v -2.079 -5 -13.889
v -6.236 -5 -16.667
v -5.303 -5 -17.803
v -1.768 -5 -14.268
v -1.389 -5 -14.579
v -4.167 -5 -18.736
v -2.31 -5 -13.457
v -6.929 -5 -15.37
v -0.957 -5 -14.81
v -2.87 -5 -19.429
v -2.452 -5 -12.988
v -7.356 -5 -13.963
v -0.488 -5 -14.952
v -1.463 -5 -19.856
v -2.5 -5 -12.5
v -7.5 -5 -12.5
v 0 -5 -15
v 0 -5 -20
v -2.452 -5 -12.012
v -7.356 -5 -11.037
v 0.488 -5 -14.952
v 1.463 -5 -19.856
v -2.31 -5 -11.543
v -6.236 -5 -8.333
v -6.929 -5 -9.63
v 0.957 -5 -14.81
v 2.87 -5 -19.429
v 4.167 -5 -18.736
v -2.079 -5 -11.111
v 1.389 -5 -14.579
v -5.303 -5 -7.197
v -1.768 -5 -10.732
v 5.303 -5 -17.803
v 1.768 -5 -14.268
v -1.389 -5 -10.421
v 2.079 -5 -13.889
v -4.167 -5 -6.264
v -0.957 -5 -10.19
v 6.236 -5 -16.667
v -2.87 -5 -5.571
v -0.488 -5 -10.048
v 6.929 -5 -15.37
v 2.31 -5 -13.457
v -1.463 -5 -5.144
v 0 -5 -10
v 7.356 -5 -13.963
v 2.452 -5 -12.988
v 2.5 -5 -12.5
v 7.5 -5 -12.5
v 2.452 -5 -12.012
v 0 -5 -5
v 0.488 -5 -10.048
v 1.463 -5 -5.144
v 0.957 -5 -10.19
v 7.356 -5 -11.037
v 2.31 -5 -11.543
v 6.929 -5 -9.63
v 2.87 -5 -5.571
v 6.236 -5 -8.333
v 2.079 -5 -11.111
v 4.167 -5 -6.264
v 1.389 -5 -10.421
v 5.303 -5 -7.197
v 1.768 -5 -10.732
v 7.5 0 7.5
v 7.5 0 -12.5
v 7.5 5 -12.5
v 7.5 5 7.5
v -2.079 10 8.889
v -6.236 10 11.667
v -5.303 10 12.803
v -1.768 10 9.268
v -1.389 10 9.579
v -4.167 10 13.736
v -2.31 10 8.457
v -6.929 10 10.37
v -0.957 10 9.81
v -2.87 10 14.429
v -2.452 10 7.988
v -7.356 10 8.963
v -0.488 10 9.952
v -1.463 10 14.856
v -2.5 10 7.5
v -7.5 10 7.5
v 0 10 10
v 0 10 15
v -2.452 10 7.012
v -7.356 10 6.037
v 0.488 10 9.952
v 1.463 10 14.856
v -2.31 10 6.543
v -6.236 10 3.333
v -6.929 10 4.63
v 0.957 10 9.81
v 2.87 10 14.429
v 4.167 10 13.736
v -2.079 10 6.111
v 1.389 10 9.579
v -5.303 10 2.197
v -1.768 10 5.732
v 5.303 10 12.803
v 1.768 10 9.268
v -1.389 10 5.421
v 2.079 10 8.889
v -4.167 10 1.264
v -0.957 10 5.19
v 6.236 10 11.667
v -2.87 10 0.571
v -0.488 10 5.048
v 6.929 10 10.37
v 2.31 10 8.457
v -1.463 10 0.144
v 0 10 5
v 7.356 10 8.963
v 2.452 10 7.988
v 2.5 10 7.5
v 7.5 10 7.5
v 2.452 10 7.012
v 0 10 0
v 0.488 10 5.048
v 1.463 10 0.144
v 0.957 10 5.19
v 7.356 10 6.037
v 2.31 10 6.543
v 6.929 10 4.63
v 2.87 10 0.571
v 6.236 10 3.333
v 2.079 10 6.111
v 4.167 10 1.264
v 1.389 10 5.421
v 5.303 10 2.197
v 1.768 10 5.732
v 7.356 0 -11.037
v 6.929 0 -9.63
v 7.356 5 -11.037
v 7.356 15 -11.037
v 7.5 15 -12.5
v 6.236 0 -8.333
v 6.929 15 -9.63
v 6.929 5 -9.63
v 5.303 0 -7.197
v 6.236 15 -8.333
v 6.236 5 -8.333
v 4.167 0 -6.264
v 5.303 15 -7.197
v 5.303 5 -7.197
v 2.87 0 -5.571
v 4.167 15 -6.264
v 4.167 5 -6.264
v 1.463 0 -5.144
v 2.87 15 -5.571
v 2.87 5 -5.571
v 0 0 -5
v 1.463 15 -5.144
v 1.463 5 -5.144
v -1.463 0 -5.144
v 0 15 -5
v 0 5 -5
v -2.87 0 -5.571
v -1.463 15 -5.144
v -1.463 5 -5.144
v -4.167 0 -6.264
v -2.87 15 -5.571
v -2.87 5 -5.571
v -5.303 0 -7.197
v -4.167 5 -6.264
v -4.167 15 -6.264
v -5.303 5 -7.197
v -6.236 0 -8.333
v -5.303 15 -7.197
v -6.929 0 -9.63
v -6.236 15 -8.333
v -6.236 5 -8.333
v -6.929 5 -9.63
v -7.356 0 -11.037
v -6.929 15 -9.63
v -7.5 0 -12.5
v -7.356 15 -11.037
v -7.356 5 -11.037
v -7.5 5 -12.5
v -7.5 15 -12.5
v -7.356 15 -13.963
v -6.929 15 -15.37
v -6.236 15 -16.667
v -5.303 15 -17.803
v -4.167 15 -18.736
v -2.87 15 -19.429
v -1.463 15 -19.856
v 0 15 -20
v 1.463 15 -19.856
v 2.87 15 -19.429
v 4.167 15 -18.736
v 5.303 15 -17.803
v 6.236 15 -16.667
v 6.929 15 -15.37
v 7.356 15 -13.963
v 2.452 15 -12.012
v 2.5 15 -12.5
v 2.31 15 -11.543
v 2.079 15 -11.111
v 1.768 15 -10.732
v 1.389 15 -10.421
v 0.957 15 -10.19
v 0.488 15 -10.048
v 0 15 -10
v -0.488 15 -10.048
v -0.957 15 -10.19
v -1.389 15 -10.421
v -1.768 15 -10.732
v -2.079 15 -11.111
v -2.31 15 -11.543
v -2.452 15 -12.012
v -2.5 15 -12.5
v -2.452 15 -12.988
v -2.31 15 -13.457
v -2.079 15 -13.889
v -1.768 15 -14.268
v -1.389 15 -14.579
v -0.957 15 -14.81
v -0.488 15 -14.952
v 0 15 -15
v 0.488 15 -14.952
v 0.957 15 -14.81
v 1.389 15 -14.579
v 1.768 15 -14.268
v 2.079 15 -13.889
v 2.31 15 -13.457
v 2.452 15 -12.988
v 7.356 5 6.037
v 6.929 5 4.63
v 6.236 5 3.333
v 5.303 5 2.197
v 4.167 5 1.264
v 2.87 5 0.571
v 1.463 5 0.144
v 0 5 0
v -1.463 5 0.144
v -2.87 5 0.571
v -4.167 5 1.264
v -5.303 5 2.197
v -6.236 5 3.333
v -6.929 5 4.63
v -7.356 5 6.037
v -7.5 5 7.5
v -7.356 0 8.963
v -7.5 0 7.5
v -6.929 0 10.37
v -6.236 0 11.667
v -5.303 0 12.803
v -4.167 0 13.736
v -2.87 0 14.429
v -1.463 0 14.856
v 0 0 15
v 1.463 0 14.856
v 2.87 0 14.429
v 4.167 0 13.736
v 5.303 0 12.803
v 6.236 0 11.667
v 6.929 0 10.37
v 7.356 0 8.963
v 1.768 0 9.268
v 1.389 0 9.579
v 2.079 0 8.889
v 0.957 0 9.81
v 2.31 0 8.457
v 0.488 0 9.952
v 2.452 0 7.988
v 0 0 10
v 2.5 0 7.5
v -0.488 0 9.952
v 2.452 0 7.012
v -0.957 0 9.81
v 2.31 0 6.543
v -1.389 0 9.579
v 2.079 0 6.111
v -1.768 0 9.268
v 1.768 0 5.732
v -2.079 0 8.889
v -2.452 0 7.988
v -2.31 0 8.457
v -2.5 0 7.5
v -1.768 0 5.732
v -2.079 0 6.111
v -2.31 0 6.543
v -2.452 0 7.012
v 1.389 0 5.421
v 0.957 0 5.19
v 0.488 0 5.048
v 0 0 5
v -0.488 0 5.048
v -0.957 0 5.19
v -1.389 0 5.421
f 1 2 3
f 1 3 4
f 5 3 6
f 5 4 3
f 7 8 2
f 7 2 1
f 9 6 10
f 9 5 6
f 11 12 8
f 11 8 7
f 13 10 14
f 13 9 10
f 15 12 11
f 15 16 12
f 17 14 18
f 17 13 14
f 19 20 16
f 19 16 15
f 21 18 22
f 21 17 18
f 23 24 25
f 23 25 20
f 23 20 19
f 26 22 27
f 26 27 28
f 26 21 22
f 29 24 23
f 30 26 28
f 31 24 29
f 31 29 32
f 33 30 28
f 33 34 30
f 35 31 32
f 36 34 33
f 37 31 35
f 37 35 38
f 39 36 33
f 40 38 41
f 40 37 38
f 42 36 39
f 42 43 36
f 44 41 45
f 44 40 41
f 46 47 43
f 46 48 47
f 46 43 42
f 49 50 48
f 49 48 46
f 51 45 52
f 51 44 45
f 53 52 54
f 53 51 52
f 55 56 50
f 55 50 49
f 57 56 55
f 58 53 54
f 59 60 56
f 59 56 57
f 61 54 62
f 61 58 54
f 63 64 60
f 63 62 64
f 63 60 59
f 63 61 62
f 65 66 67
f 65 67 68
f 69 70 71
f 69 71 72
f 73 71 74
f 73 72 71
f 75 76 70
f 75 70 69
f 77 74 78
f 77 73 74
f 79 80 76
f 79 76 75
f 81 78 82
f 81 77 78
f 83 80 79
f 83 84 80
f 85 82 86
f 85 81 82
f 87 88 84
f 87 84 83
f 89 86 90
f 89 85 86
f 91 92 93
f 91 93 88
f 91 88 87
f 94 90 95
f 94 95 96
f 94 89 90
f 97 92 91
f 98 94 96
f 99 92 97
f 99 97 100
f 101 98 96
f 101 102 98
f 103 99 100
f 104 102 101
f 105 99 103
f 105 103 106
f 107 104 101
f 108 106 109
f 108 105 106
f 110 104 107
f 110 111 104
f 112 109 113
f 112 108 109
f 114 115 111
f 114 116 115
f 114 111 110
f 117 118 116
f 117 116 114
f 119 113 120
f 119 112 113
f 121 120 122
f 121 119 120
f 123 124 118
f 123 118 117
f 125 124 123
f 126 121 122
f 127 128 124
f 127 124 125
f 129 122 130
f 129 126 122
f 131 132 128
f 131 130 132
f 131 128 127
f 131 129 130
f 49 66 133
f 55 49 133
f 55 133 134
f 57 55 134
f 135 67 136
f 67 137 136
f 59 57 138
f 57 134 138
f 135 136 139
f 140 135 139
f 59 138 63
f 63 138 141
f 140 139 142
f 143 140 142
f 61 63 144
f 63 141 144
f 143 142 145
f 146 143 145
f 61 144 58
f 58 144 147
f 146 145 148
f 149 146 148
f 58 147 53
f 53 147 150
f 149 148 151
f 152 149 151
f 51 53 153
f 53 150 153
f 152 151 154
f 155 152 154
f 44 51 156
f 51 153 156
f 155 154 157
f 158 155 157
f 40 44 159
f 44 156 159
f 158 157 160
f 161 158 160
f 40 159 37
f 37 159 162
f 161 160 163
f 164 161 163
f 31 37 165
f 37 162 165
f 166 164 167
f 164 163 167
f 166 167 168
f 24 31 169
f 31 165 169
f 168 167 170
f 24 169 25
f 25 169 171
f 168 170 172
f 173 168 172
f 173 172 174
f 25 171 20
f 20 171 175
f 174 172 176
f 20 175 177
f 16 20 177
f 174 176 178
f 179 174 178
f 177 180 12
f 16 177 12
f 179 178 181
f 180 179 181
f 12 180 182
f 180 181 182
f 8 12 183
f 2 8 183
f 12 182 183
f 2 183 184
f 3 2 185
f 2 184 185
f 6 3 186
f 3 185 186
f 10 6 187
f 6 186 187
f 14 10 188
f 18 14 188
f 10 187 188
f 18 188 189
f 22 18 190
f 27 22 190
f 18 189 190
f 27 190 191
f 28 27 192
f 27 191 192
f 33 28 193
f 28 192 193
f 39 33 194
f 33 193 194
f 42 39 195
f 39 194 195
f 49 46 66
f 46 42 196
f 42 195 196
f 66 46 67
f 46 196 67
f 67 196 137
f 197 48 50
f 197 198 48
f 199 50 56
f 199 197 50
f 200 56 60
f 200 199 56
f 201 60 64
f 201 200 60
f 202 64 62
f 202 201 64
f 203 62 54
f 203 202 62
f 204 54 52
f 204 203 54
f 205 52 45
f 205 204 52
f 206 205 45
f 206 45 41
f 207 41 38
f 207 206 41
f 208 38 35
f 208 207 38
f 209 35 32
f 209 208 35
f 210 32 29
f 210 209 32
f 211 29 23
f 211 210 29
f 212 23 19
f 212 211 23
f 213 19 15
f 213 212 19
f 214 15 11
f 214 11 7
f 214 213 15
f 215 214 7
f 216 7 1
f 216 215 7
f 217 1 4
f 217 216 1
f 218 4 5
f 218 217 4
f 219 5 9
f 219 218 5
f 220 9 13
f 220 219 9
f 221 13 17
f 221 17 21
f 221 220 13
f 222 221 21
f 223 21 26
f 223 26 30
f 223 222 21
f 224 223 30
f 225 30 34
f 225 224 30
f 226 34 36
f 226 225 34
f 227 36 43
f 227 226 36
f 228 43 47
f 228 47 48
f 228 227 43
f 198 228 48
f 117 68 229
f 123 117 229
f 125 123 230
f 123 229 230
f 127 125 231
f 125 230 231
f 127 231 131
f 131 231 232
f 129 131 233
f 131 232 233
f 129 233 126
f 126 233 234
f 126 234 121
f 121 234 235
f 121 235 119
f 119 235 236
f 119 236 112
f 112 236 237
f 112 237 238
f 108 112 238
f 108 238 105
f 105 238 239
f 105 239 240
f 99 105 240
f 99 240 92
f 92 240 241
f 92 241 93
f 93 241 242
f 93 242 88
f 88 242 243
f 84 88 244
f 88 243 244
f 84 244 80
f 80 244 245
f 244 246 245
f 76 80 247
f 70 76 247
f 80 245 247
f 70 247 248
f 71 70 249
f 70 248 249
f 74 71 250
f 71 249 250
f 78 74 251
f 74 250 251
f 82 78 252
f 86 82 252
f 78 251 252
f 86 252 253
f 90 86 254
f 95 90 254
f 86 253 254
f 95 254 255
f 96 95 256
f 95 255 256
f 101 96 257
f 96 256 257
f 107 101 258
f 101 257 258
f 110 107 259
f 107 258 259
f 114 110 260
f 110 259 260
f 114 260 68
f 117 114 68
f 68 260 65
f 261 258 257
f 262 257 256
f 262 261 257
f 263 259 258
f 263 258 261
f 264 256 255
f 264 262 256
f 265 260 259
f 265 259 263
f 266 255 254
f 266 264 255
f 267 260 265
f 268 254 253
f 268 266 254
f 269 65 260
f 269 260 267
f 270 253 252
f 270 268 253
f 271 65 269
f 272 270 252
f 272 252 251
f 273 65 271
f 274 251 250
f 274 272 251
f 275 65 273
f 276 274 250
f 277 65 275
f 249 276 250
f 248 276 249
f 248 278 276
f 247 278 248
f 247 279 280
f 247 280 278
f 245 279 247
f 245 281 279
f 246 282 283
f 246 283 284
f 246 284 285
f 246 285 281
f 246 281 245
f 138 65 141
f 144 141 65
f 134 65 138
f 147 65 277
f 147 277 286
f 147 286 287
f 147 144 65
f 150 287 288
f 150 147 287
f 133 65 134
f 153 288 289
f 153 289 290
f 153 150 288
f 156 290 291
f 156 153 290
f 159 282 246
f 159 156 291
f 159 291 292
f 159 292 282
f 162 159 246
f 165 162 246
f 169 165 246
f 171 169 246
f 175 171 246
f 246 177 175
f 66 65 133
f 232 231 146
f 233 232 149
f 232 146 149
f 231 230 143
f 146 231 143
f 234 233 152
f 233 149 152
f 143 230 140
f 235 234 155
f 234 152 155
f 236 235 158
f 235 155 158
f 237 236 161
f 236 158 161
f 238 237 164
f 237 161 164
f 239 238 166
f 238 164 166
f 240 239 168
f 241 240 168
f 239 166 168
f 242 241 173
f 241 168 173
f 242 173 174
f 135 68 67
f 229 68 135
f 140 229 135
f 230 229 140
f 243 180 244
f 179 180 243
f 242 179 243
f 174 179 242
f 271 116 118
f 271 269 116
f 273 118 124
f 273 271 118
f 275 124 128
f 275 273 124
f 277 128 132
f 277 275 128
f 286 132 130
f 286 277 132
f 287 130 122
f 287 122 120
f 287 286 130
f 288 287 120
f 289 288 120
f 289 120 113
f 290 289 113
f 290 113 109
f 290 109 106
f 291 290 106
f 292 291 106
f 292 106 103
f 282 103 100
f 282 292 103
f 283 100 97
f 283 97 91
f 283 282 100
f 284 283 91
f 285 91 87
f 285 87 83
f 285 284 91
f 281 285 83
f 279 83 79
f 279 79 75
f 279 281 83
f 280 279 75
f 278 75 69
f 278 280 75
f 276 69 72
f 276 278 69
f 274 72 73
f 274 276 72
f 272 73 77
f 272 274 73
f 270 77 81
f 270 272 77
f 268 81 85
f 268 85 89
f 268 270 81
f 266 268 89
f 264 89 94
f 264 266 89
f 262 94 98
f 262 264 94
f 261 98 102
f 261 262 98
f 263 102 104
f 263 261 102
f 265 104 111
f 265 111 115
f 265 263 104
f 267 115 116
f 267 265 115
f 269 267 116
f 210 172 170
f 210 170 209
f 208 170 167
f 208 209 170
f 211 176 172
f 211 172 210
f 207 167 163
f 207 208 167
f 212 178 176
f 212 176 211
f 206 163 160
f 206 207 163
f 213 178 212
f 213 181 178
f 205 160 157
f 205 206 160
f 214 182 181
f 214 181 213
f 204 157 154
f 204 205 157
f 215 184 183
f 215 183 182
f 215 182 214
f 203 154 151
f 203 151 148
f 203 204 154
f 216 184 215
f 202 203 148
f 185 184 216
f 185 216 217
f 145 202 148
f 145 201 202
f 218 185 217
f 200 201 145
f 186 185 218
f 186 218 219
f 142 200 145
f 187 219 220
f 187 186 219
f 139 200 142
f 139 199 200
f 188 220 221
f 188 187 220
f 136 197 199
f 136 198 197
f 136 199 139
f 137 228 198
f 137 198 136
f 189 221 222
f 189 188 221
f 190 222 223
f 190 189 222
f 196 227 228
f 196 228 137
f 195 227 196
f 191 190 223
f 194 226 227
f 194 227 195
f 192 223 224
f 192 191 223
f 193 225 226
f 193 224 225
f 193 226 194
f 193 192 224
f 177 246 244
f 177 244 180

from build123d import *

# Parameters (mm, degrees)
CROQUIS3_R              = 2.5
SALIENTE_EXTRUIR1_DEPTH = 5
CROQUIS4_R              = 7.5
CROQUIS4_R_2            = 2.5
SALIENTE_EXTRUIR2_DEPTH = 5
CROQUIS5_R              = 7.5
CROQUIS5_R_2            = 2.5
SALIENTE_EXTRUIR3_DEPTH = 10
CROQUIS7_R              = 7.5
CROQUIS7_R_2            = 2.5
SALIENTE_EXTRUIR4_DEPTH = 5


with BuildPart() as part:
    # Croquis3 → Saliente-Extruir1 (new body)
    with BuildSketch(Plane(origin=(0, 0, 0), x_dir=(1, 0, 0), z_dir=(0, 1, 0))):
        with BuildLine():
            Line((-7.5, -7.5), (-7.5, 12.5))
            ThreePointArc((-7.5, 12.5), (0, 20), (7.5, 12.5))
            Line((7.5, 12.5), (7.5, -7.5))
            ThreePointArc((7.5, -7.5), (0, -15), (-7.5, -7.5))
        make_face()
        with Locations((0, 12.5)):
            Circle(CROQUIS3_R, mode=Mode.SUBTRACT)
        with Locations((0, -7.5)):
            Circle(CROQUIS3_R, mode=Mode.SUBTRACT)
    extrude(amount=SALIENTE_EXTRUIR1_DEPTH)

    # Croquis4 → Saliente-Extruir2 (add)
    with BuildSketch(Plane(origin=(0, 5, 0), x_dir=(1, 0, 0), z_dir=(0, 1, 0))):
        with Locations((0, -7.5)):
            Circle(CROQUIS4_R)
        with Locations((0, -7.5)):
            Circle(CROQUIS4_R_2, mode=Mode.SUBTRACT)
    extrude(amount=SALIENTE_EXTRUIR2_DEPTH)

    # Croquis5 → Saliente-Extruir3 (add)
    with BuildSketch(Plane(origin=(0, 5, 0), x_dir=(1, 0, 0), z_dir=(0, 1, 0))):
        with Locations((0, 12.5)):
            Circle(CROQUIS5_R)
        with Locations((0, 12.5)):
            Circle(CROQUIS5_R_2, mode=Mode.SUBTRACT)
    extrude(amount=SALIENTE_EXTRUIR3_DEPTH)

    # Croquis7 → Saliente-Extruir4 (add)
    with BuildSketch(Plane.XZ):
        with Locations((0, -12.5)):
            Circle(CROQUIS7_R)
        with Locations((0, -12.5)):
            Circle(CROQUIS7_R_2, mode=Mode.SUBTRACT)
    extrude(amount=SALIENTE_EXTRUIR4_DEPTH)


solid = part.part
